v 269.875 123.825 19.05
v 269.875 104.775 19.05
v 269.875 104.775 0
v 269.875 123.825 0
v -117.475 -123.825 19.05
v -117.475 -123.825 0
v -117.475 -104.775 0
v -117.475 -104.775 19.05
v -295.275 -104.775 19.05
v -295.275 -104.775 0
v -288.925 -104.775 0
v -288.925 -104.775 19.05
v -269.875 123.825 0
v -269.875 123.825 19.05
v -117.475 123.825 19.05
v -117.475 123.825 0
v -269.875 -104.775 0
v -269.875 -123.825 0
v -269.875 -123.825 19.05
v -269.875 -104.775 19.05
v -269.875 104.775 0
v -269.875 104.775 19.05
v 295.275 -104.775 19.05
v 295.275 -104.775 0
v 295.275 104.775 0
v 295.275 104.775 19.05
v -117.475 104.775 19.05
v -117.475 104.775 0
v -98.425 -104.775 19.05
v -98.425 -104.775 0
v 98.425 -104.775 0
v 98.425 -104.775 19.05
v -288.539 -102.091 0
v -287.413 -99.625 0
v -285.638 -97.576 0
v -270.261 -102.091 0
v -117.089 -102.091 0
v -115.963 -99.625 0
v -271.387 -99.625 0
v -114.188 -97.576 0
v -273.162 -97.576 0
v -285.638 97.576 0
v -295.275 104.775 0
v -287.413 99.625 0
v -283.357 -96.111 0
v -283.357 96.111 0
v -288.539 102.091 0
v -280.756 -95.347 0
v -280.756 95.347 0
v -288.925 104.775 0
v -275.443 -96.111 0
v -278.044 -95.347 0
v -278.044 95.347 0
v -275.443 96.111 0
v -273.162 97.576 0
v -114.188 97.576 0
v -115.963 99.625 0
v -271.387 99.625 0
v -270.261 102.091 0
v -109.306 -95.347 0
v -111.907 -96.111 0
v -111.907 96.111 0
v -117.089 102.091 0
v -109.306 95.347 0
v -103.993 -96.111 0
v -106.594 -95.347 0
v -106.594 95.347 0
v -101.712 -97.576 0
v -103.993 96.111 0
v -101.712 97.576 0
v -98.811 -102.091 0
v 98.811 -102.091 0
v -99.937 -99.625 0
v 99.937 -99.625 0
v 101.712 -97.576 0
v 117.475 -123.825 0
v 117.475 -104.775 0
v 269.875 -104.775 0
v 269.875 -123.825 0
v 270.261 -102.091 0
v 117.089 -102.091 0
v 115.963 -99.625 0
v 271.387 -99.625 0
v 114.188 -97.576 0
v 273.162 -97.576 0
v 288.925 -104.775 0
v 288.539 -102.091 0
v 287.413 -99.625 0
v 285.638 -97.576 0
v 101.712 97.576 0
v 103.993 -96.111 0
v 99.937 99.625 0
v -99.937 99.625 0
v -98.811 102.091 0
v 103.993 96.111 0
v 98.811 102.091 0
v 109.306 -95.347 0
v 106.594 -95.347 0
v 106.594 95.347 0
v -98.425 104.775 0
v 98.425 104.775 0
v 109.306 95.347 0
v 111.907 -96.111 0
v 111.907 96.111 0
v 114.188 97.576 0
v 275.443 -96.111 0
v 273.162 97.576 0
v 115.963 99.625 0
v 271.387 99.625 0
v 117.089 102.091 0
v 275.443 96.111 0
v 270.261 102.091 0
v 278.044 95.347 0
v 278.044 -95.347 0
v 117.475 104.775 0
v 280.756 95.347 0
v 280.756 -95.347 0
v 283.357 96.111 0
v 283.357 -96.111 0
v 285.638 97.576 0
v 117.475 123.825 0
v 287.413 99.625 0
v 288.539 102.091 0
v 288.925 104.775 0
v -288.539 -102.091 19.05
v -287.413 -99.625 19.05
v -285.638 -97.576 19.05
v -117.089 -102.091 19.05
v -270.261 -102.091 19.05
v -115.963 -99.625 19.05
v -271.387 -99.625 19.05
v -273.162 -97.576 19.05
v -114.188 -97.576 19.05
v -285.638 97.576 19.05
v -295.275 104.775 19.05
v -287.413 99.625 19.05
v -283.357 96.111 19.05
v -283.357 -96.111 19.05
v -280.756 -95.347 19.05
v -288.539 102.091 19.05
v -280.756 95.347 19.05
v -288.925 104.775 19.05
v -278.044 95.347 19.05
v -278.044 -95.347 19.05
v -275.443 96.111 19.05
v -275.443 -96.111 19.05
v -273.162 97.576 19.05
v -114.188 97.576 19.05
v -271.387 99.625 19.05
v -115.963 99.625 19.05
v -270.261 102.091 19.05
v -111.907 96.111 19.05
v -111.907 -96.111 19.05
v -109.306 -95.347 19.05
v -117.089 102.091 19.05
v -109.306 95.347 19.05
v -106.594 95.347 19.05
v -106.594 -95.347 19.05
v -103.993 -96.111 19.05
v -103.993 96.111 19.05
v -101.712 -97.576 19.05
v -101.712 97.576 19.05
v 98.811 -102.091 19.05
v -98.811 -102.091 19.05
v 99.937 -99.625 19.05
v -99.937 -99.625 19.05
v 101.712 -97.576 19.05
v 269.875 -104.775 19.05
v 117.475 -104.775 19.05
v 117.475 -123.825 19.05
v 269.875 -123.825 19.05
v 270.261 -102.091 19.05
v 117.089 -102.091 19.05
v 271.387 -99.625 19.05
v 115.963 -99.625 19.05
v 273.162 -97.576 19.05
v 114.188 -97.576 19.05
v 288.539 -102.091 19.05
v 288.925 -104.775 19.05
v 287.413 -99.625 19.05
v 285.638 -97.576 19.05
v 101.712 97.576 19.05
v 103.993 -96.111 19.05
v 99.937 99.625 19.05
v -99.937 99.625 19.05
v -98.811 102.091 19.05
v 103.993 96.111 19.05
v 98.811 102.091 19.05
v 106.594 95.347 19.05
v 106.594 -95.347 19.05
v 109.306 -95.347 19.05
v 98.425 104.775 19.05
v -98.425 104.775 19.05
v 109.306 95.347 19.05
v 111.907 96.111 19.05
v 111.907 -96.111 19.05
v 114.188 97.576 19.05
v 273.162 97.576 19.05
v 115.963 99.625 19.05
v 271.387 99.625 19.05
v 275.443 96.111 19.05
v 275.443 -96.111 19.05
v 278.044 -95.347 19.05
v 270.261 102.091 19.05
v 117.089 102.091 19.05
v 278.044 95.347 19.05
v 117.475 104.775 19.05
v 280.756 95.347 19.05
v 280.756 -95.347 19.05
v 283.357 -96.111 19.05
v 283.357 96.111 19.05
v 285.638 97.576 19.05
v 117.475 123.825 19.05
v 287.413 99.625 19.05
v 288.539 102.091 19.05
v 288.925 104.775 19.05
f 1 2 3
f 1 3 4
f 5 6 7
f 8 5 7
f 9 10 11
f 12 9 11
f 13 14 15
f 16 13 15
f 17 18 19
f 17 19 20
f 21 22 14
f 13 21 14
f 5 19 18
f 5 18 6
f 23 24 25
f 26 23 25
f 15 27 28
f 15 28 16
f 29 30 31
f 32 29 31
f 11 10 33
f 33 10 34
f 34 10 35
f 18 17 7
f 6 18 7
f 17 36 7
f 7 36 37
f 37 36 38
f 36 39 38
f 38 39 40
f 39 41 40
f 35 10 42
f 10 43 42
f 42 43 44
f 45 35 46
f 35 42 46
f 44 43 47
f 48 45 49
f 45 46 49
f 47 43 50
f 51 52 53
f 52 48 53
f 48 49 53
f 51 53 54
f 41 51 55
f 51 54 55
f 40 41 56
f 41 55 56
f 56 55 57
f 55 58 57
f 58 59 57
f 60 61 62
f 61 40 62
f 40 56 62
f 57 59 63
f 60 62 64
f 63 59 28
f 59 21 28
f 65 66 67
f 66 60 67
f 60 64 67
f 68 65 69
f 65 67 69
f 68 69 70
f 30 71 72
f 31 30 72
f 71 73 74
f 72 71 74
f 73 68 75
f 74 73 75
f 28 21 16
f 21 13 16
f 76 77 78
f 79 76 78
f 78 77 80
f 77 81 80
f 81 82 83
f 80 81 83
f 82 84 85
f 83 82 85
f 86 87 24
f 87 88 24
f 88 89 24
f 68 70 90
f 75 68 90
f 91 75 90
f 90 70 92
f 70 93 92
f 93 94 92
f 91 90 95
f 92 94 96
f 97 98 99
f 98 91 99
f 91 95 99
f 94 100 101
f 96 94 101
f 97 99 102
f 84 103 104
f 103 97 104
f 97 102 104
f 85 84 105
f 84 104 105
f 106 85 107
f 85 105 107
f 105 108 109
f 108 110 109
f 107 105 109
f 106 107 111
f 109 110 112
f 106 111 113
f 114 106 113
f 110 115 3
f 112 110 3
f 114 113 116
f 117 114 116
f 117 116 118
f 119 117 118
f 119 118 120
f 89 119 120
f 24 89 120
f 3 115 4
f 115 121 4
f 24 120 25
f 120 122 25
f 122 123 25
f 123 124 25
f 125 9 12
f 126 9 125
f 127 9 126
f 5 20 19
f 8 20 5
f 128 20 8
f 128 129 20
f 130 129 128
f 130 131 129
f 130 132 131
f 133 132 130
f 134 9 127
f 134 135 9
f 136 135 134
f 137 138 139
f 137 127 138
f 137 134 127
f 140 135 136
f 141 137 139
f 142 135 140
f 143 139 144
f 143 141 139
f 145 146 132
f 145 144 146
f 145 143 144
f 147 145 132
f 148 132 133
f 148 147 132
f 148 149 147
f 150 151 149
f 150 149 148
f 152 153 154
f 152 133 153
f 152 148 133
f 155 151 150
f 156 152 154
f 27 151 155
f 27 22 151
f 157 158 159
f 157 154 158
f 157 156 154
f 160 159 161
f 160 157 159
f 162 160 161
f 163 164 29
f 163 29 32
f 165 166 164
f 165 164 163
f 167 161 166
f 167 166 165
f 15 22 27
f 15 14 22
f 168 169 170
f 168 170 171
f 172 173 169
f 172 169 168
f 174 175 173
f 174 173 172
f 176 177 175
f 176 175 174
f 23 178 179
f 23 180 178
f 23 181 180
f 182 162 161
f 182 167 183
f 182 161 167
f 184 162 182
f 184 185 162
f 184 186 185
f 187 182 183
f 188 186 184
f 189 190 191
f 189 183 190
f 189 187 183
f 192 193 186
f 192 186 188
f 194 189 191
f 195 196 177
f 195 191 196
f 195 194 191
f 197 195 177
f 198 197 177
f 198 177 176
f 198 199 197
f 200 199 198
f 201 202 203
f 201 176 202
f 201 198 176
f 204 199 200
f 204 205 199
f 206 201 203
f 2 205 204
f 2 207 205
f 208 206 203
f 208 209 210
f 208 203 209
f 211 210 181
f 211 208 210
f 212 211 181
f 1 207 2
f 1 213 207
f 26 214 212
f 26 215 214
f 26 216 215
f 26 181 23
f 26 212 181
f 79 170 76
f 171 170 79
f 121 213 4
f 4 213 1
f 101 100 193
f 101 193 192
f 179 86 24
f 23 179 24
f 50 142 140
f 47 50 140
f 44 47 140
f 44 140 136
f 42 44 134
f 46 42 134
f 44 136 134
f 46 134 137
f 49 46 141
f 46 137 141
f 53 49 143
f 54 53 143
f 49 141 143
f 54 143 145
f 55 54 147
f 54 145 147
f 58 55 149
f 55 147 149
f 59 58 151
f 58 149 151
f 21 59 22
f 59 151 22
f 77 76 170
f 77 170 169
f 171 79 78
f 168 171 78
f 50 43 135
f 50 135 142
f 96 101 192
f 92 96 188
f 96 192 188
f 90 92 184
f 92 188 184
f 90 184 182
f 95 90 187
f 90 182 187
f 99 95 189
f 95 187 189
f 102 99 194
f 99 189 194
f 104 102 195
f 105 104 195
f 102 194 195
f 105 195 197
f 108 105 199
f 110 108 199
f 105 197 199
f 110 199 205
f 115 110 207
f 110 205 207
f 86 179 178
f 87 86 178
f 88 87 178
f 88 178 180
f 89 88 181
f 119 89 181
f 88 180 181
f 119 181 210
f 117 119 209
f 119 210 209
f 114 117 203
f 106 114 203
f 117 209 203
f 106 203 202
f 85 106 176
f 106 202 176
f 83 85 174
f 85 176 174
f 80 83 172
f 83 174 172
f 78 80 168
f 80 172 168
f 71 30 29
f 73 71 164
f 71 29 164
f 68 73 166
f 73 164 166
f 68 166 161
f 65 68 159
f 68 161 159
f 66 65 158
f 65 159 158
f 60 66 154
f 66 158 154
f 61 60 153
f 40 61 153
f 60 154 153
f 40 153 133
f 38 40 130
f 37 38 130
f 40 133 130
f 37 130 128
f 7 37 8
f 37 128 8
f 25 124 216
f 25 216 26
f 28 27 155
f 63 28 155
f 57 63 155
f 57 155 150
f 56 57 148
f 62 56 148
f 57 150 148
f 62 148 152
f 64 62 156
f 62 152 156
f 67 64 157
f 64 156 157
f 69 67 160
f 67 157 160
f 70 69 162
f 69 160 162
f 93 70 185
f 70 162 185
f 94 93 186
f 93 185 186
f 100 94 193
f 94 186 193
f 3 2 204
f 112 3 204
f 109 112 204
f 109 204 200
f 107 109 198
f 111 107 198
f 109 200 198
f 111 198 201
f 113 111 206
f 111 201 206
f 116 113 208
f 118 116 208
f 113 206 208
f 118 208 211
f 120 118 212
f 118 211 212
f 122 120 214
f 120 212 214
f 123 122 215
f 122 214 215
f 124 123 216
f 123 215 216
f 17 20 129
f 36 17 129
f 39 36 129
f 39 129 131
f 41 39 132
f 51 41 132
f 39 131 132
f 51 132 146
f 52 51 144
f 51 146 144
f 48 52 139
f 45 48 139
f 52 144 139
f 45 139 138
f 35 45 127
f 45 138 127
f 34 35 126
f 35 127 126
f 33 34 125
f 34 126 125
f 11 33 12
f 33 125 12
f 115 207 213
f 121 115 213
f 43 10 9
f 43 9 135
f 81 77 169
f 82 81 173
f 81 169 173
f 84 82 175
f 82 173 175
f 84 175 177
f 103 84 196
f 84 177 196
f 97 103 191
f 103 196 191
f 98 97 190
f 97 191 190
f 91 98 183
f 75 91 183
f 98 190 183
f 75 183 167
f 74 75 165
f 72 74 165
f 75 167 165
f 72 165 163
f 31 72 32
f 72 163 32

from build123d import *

# Parameters (mm, degrees)
F1_W     = 590.55
F1_H     = 209.55
F2_DEPTH = 19.05
F3_W     = 152.4
F3_H     = 247.65
F4_DEPTH = 19.05
F6_DEPTH = 25.4


# Not quite as in the source:
# - a variable given as a bare number and used for a length is read in inches; the dataset says mm whatever the document's units were


with BuildPart() as f2:
    # F1 (on Top) → F2 (new body)
    with BuildSketch(Plane.XY):
        Rectangle(F1_W, F1_H)
    extrude(amount=F2_DEPTH)

    # F3 (on face) → F4 (join)
    with BuildSketch(Plane.XY.offset(19.05)):
        with Locations((-193.675, 0)):
            Rectangle(F3_W, F3_H)
        with Locations((193.675, 0)):
            Rectangle(F3_W, F3_H)
    extrude(amount=-F4_DEPTH)

    # F5 (on face) → F6 (cut)
    with BuildSketch(Plane.XY.offset(19.05)):
        with BuildLine():
            Line((-98.425, 104.775), (-117.475, 104.775))
            ThreePointArc((-117.475, 104.775), (-107.95, 95.25), (-98.425, 104.775))
        make_face()
        with BuildLine():
            ThreePointArc((-98.425, 104.775), (-107.95, 114.3), (-117.475, 104.775))
            Line((-117.475, 104.775), (-98.425, 104.775))
        make_face()
        with BuildLine():
            Line((-117.475, -104.775), (-98.425, -104.775))
            ThreePointArc((-98.425, -104.775), (-107.95, -95.25), (-117.475, -104.775))
        make_face()
        with BuildLine():
            Line((98.425, -104.775), (117.475, -104.775))
            ThreePointArc((117.475, -104.775), (107.95, -95.25), (98.425, -104.775))
        make_face()
        with BuildLine():
            Line((117.475, 104.775), (98.425, 104.775))
            ThreePointArc((98.425, 104.775), (107.95, 95.25), (117.475, 104.775))
        make_face()
        with BuildLine():
            Line((288.925, 104.775), (269.875, 104.775))
            ThreePointArc((269.875, 104.775), (279.4, 95.25), (288.925, 104.775))
        make_face()
        with BuildLine():
            Line((269.875, -104.775), (288.925, -104.775))
            ThreePointArc((288.925, -104.775), (279.4, -95.25), (269.875, -104.775))
        make_face()
        with BuildLine():
            Line((-288.925, -104.775), (-269.875, -104.775))
            ThreePointArc((-269.875, -104.775), (-279.4, -95.25), (-288.925, -104.775))
        make_face()
        with BuildLine():
            Line((-269.875, 104.775), (-288.925, 104.775))
            ThreePointArc((-288.925, 104.775), (-279.4, 95.25), (-269.875, 104.775))
        make_face()
    extrude(amount=-F6_DEPTH, mode=Mode.SUBTRACT)


solid = f2.part
